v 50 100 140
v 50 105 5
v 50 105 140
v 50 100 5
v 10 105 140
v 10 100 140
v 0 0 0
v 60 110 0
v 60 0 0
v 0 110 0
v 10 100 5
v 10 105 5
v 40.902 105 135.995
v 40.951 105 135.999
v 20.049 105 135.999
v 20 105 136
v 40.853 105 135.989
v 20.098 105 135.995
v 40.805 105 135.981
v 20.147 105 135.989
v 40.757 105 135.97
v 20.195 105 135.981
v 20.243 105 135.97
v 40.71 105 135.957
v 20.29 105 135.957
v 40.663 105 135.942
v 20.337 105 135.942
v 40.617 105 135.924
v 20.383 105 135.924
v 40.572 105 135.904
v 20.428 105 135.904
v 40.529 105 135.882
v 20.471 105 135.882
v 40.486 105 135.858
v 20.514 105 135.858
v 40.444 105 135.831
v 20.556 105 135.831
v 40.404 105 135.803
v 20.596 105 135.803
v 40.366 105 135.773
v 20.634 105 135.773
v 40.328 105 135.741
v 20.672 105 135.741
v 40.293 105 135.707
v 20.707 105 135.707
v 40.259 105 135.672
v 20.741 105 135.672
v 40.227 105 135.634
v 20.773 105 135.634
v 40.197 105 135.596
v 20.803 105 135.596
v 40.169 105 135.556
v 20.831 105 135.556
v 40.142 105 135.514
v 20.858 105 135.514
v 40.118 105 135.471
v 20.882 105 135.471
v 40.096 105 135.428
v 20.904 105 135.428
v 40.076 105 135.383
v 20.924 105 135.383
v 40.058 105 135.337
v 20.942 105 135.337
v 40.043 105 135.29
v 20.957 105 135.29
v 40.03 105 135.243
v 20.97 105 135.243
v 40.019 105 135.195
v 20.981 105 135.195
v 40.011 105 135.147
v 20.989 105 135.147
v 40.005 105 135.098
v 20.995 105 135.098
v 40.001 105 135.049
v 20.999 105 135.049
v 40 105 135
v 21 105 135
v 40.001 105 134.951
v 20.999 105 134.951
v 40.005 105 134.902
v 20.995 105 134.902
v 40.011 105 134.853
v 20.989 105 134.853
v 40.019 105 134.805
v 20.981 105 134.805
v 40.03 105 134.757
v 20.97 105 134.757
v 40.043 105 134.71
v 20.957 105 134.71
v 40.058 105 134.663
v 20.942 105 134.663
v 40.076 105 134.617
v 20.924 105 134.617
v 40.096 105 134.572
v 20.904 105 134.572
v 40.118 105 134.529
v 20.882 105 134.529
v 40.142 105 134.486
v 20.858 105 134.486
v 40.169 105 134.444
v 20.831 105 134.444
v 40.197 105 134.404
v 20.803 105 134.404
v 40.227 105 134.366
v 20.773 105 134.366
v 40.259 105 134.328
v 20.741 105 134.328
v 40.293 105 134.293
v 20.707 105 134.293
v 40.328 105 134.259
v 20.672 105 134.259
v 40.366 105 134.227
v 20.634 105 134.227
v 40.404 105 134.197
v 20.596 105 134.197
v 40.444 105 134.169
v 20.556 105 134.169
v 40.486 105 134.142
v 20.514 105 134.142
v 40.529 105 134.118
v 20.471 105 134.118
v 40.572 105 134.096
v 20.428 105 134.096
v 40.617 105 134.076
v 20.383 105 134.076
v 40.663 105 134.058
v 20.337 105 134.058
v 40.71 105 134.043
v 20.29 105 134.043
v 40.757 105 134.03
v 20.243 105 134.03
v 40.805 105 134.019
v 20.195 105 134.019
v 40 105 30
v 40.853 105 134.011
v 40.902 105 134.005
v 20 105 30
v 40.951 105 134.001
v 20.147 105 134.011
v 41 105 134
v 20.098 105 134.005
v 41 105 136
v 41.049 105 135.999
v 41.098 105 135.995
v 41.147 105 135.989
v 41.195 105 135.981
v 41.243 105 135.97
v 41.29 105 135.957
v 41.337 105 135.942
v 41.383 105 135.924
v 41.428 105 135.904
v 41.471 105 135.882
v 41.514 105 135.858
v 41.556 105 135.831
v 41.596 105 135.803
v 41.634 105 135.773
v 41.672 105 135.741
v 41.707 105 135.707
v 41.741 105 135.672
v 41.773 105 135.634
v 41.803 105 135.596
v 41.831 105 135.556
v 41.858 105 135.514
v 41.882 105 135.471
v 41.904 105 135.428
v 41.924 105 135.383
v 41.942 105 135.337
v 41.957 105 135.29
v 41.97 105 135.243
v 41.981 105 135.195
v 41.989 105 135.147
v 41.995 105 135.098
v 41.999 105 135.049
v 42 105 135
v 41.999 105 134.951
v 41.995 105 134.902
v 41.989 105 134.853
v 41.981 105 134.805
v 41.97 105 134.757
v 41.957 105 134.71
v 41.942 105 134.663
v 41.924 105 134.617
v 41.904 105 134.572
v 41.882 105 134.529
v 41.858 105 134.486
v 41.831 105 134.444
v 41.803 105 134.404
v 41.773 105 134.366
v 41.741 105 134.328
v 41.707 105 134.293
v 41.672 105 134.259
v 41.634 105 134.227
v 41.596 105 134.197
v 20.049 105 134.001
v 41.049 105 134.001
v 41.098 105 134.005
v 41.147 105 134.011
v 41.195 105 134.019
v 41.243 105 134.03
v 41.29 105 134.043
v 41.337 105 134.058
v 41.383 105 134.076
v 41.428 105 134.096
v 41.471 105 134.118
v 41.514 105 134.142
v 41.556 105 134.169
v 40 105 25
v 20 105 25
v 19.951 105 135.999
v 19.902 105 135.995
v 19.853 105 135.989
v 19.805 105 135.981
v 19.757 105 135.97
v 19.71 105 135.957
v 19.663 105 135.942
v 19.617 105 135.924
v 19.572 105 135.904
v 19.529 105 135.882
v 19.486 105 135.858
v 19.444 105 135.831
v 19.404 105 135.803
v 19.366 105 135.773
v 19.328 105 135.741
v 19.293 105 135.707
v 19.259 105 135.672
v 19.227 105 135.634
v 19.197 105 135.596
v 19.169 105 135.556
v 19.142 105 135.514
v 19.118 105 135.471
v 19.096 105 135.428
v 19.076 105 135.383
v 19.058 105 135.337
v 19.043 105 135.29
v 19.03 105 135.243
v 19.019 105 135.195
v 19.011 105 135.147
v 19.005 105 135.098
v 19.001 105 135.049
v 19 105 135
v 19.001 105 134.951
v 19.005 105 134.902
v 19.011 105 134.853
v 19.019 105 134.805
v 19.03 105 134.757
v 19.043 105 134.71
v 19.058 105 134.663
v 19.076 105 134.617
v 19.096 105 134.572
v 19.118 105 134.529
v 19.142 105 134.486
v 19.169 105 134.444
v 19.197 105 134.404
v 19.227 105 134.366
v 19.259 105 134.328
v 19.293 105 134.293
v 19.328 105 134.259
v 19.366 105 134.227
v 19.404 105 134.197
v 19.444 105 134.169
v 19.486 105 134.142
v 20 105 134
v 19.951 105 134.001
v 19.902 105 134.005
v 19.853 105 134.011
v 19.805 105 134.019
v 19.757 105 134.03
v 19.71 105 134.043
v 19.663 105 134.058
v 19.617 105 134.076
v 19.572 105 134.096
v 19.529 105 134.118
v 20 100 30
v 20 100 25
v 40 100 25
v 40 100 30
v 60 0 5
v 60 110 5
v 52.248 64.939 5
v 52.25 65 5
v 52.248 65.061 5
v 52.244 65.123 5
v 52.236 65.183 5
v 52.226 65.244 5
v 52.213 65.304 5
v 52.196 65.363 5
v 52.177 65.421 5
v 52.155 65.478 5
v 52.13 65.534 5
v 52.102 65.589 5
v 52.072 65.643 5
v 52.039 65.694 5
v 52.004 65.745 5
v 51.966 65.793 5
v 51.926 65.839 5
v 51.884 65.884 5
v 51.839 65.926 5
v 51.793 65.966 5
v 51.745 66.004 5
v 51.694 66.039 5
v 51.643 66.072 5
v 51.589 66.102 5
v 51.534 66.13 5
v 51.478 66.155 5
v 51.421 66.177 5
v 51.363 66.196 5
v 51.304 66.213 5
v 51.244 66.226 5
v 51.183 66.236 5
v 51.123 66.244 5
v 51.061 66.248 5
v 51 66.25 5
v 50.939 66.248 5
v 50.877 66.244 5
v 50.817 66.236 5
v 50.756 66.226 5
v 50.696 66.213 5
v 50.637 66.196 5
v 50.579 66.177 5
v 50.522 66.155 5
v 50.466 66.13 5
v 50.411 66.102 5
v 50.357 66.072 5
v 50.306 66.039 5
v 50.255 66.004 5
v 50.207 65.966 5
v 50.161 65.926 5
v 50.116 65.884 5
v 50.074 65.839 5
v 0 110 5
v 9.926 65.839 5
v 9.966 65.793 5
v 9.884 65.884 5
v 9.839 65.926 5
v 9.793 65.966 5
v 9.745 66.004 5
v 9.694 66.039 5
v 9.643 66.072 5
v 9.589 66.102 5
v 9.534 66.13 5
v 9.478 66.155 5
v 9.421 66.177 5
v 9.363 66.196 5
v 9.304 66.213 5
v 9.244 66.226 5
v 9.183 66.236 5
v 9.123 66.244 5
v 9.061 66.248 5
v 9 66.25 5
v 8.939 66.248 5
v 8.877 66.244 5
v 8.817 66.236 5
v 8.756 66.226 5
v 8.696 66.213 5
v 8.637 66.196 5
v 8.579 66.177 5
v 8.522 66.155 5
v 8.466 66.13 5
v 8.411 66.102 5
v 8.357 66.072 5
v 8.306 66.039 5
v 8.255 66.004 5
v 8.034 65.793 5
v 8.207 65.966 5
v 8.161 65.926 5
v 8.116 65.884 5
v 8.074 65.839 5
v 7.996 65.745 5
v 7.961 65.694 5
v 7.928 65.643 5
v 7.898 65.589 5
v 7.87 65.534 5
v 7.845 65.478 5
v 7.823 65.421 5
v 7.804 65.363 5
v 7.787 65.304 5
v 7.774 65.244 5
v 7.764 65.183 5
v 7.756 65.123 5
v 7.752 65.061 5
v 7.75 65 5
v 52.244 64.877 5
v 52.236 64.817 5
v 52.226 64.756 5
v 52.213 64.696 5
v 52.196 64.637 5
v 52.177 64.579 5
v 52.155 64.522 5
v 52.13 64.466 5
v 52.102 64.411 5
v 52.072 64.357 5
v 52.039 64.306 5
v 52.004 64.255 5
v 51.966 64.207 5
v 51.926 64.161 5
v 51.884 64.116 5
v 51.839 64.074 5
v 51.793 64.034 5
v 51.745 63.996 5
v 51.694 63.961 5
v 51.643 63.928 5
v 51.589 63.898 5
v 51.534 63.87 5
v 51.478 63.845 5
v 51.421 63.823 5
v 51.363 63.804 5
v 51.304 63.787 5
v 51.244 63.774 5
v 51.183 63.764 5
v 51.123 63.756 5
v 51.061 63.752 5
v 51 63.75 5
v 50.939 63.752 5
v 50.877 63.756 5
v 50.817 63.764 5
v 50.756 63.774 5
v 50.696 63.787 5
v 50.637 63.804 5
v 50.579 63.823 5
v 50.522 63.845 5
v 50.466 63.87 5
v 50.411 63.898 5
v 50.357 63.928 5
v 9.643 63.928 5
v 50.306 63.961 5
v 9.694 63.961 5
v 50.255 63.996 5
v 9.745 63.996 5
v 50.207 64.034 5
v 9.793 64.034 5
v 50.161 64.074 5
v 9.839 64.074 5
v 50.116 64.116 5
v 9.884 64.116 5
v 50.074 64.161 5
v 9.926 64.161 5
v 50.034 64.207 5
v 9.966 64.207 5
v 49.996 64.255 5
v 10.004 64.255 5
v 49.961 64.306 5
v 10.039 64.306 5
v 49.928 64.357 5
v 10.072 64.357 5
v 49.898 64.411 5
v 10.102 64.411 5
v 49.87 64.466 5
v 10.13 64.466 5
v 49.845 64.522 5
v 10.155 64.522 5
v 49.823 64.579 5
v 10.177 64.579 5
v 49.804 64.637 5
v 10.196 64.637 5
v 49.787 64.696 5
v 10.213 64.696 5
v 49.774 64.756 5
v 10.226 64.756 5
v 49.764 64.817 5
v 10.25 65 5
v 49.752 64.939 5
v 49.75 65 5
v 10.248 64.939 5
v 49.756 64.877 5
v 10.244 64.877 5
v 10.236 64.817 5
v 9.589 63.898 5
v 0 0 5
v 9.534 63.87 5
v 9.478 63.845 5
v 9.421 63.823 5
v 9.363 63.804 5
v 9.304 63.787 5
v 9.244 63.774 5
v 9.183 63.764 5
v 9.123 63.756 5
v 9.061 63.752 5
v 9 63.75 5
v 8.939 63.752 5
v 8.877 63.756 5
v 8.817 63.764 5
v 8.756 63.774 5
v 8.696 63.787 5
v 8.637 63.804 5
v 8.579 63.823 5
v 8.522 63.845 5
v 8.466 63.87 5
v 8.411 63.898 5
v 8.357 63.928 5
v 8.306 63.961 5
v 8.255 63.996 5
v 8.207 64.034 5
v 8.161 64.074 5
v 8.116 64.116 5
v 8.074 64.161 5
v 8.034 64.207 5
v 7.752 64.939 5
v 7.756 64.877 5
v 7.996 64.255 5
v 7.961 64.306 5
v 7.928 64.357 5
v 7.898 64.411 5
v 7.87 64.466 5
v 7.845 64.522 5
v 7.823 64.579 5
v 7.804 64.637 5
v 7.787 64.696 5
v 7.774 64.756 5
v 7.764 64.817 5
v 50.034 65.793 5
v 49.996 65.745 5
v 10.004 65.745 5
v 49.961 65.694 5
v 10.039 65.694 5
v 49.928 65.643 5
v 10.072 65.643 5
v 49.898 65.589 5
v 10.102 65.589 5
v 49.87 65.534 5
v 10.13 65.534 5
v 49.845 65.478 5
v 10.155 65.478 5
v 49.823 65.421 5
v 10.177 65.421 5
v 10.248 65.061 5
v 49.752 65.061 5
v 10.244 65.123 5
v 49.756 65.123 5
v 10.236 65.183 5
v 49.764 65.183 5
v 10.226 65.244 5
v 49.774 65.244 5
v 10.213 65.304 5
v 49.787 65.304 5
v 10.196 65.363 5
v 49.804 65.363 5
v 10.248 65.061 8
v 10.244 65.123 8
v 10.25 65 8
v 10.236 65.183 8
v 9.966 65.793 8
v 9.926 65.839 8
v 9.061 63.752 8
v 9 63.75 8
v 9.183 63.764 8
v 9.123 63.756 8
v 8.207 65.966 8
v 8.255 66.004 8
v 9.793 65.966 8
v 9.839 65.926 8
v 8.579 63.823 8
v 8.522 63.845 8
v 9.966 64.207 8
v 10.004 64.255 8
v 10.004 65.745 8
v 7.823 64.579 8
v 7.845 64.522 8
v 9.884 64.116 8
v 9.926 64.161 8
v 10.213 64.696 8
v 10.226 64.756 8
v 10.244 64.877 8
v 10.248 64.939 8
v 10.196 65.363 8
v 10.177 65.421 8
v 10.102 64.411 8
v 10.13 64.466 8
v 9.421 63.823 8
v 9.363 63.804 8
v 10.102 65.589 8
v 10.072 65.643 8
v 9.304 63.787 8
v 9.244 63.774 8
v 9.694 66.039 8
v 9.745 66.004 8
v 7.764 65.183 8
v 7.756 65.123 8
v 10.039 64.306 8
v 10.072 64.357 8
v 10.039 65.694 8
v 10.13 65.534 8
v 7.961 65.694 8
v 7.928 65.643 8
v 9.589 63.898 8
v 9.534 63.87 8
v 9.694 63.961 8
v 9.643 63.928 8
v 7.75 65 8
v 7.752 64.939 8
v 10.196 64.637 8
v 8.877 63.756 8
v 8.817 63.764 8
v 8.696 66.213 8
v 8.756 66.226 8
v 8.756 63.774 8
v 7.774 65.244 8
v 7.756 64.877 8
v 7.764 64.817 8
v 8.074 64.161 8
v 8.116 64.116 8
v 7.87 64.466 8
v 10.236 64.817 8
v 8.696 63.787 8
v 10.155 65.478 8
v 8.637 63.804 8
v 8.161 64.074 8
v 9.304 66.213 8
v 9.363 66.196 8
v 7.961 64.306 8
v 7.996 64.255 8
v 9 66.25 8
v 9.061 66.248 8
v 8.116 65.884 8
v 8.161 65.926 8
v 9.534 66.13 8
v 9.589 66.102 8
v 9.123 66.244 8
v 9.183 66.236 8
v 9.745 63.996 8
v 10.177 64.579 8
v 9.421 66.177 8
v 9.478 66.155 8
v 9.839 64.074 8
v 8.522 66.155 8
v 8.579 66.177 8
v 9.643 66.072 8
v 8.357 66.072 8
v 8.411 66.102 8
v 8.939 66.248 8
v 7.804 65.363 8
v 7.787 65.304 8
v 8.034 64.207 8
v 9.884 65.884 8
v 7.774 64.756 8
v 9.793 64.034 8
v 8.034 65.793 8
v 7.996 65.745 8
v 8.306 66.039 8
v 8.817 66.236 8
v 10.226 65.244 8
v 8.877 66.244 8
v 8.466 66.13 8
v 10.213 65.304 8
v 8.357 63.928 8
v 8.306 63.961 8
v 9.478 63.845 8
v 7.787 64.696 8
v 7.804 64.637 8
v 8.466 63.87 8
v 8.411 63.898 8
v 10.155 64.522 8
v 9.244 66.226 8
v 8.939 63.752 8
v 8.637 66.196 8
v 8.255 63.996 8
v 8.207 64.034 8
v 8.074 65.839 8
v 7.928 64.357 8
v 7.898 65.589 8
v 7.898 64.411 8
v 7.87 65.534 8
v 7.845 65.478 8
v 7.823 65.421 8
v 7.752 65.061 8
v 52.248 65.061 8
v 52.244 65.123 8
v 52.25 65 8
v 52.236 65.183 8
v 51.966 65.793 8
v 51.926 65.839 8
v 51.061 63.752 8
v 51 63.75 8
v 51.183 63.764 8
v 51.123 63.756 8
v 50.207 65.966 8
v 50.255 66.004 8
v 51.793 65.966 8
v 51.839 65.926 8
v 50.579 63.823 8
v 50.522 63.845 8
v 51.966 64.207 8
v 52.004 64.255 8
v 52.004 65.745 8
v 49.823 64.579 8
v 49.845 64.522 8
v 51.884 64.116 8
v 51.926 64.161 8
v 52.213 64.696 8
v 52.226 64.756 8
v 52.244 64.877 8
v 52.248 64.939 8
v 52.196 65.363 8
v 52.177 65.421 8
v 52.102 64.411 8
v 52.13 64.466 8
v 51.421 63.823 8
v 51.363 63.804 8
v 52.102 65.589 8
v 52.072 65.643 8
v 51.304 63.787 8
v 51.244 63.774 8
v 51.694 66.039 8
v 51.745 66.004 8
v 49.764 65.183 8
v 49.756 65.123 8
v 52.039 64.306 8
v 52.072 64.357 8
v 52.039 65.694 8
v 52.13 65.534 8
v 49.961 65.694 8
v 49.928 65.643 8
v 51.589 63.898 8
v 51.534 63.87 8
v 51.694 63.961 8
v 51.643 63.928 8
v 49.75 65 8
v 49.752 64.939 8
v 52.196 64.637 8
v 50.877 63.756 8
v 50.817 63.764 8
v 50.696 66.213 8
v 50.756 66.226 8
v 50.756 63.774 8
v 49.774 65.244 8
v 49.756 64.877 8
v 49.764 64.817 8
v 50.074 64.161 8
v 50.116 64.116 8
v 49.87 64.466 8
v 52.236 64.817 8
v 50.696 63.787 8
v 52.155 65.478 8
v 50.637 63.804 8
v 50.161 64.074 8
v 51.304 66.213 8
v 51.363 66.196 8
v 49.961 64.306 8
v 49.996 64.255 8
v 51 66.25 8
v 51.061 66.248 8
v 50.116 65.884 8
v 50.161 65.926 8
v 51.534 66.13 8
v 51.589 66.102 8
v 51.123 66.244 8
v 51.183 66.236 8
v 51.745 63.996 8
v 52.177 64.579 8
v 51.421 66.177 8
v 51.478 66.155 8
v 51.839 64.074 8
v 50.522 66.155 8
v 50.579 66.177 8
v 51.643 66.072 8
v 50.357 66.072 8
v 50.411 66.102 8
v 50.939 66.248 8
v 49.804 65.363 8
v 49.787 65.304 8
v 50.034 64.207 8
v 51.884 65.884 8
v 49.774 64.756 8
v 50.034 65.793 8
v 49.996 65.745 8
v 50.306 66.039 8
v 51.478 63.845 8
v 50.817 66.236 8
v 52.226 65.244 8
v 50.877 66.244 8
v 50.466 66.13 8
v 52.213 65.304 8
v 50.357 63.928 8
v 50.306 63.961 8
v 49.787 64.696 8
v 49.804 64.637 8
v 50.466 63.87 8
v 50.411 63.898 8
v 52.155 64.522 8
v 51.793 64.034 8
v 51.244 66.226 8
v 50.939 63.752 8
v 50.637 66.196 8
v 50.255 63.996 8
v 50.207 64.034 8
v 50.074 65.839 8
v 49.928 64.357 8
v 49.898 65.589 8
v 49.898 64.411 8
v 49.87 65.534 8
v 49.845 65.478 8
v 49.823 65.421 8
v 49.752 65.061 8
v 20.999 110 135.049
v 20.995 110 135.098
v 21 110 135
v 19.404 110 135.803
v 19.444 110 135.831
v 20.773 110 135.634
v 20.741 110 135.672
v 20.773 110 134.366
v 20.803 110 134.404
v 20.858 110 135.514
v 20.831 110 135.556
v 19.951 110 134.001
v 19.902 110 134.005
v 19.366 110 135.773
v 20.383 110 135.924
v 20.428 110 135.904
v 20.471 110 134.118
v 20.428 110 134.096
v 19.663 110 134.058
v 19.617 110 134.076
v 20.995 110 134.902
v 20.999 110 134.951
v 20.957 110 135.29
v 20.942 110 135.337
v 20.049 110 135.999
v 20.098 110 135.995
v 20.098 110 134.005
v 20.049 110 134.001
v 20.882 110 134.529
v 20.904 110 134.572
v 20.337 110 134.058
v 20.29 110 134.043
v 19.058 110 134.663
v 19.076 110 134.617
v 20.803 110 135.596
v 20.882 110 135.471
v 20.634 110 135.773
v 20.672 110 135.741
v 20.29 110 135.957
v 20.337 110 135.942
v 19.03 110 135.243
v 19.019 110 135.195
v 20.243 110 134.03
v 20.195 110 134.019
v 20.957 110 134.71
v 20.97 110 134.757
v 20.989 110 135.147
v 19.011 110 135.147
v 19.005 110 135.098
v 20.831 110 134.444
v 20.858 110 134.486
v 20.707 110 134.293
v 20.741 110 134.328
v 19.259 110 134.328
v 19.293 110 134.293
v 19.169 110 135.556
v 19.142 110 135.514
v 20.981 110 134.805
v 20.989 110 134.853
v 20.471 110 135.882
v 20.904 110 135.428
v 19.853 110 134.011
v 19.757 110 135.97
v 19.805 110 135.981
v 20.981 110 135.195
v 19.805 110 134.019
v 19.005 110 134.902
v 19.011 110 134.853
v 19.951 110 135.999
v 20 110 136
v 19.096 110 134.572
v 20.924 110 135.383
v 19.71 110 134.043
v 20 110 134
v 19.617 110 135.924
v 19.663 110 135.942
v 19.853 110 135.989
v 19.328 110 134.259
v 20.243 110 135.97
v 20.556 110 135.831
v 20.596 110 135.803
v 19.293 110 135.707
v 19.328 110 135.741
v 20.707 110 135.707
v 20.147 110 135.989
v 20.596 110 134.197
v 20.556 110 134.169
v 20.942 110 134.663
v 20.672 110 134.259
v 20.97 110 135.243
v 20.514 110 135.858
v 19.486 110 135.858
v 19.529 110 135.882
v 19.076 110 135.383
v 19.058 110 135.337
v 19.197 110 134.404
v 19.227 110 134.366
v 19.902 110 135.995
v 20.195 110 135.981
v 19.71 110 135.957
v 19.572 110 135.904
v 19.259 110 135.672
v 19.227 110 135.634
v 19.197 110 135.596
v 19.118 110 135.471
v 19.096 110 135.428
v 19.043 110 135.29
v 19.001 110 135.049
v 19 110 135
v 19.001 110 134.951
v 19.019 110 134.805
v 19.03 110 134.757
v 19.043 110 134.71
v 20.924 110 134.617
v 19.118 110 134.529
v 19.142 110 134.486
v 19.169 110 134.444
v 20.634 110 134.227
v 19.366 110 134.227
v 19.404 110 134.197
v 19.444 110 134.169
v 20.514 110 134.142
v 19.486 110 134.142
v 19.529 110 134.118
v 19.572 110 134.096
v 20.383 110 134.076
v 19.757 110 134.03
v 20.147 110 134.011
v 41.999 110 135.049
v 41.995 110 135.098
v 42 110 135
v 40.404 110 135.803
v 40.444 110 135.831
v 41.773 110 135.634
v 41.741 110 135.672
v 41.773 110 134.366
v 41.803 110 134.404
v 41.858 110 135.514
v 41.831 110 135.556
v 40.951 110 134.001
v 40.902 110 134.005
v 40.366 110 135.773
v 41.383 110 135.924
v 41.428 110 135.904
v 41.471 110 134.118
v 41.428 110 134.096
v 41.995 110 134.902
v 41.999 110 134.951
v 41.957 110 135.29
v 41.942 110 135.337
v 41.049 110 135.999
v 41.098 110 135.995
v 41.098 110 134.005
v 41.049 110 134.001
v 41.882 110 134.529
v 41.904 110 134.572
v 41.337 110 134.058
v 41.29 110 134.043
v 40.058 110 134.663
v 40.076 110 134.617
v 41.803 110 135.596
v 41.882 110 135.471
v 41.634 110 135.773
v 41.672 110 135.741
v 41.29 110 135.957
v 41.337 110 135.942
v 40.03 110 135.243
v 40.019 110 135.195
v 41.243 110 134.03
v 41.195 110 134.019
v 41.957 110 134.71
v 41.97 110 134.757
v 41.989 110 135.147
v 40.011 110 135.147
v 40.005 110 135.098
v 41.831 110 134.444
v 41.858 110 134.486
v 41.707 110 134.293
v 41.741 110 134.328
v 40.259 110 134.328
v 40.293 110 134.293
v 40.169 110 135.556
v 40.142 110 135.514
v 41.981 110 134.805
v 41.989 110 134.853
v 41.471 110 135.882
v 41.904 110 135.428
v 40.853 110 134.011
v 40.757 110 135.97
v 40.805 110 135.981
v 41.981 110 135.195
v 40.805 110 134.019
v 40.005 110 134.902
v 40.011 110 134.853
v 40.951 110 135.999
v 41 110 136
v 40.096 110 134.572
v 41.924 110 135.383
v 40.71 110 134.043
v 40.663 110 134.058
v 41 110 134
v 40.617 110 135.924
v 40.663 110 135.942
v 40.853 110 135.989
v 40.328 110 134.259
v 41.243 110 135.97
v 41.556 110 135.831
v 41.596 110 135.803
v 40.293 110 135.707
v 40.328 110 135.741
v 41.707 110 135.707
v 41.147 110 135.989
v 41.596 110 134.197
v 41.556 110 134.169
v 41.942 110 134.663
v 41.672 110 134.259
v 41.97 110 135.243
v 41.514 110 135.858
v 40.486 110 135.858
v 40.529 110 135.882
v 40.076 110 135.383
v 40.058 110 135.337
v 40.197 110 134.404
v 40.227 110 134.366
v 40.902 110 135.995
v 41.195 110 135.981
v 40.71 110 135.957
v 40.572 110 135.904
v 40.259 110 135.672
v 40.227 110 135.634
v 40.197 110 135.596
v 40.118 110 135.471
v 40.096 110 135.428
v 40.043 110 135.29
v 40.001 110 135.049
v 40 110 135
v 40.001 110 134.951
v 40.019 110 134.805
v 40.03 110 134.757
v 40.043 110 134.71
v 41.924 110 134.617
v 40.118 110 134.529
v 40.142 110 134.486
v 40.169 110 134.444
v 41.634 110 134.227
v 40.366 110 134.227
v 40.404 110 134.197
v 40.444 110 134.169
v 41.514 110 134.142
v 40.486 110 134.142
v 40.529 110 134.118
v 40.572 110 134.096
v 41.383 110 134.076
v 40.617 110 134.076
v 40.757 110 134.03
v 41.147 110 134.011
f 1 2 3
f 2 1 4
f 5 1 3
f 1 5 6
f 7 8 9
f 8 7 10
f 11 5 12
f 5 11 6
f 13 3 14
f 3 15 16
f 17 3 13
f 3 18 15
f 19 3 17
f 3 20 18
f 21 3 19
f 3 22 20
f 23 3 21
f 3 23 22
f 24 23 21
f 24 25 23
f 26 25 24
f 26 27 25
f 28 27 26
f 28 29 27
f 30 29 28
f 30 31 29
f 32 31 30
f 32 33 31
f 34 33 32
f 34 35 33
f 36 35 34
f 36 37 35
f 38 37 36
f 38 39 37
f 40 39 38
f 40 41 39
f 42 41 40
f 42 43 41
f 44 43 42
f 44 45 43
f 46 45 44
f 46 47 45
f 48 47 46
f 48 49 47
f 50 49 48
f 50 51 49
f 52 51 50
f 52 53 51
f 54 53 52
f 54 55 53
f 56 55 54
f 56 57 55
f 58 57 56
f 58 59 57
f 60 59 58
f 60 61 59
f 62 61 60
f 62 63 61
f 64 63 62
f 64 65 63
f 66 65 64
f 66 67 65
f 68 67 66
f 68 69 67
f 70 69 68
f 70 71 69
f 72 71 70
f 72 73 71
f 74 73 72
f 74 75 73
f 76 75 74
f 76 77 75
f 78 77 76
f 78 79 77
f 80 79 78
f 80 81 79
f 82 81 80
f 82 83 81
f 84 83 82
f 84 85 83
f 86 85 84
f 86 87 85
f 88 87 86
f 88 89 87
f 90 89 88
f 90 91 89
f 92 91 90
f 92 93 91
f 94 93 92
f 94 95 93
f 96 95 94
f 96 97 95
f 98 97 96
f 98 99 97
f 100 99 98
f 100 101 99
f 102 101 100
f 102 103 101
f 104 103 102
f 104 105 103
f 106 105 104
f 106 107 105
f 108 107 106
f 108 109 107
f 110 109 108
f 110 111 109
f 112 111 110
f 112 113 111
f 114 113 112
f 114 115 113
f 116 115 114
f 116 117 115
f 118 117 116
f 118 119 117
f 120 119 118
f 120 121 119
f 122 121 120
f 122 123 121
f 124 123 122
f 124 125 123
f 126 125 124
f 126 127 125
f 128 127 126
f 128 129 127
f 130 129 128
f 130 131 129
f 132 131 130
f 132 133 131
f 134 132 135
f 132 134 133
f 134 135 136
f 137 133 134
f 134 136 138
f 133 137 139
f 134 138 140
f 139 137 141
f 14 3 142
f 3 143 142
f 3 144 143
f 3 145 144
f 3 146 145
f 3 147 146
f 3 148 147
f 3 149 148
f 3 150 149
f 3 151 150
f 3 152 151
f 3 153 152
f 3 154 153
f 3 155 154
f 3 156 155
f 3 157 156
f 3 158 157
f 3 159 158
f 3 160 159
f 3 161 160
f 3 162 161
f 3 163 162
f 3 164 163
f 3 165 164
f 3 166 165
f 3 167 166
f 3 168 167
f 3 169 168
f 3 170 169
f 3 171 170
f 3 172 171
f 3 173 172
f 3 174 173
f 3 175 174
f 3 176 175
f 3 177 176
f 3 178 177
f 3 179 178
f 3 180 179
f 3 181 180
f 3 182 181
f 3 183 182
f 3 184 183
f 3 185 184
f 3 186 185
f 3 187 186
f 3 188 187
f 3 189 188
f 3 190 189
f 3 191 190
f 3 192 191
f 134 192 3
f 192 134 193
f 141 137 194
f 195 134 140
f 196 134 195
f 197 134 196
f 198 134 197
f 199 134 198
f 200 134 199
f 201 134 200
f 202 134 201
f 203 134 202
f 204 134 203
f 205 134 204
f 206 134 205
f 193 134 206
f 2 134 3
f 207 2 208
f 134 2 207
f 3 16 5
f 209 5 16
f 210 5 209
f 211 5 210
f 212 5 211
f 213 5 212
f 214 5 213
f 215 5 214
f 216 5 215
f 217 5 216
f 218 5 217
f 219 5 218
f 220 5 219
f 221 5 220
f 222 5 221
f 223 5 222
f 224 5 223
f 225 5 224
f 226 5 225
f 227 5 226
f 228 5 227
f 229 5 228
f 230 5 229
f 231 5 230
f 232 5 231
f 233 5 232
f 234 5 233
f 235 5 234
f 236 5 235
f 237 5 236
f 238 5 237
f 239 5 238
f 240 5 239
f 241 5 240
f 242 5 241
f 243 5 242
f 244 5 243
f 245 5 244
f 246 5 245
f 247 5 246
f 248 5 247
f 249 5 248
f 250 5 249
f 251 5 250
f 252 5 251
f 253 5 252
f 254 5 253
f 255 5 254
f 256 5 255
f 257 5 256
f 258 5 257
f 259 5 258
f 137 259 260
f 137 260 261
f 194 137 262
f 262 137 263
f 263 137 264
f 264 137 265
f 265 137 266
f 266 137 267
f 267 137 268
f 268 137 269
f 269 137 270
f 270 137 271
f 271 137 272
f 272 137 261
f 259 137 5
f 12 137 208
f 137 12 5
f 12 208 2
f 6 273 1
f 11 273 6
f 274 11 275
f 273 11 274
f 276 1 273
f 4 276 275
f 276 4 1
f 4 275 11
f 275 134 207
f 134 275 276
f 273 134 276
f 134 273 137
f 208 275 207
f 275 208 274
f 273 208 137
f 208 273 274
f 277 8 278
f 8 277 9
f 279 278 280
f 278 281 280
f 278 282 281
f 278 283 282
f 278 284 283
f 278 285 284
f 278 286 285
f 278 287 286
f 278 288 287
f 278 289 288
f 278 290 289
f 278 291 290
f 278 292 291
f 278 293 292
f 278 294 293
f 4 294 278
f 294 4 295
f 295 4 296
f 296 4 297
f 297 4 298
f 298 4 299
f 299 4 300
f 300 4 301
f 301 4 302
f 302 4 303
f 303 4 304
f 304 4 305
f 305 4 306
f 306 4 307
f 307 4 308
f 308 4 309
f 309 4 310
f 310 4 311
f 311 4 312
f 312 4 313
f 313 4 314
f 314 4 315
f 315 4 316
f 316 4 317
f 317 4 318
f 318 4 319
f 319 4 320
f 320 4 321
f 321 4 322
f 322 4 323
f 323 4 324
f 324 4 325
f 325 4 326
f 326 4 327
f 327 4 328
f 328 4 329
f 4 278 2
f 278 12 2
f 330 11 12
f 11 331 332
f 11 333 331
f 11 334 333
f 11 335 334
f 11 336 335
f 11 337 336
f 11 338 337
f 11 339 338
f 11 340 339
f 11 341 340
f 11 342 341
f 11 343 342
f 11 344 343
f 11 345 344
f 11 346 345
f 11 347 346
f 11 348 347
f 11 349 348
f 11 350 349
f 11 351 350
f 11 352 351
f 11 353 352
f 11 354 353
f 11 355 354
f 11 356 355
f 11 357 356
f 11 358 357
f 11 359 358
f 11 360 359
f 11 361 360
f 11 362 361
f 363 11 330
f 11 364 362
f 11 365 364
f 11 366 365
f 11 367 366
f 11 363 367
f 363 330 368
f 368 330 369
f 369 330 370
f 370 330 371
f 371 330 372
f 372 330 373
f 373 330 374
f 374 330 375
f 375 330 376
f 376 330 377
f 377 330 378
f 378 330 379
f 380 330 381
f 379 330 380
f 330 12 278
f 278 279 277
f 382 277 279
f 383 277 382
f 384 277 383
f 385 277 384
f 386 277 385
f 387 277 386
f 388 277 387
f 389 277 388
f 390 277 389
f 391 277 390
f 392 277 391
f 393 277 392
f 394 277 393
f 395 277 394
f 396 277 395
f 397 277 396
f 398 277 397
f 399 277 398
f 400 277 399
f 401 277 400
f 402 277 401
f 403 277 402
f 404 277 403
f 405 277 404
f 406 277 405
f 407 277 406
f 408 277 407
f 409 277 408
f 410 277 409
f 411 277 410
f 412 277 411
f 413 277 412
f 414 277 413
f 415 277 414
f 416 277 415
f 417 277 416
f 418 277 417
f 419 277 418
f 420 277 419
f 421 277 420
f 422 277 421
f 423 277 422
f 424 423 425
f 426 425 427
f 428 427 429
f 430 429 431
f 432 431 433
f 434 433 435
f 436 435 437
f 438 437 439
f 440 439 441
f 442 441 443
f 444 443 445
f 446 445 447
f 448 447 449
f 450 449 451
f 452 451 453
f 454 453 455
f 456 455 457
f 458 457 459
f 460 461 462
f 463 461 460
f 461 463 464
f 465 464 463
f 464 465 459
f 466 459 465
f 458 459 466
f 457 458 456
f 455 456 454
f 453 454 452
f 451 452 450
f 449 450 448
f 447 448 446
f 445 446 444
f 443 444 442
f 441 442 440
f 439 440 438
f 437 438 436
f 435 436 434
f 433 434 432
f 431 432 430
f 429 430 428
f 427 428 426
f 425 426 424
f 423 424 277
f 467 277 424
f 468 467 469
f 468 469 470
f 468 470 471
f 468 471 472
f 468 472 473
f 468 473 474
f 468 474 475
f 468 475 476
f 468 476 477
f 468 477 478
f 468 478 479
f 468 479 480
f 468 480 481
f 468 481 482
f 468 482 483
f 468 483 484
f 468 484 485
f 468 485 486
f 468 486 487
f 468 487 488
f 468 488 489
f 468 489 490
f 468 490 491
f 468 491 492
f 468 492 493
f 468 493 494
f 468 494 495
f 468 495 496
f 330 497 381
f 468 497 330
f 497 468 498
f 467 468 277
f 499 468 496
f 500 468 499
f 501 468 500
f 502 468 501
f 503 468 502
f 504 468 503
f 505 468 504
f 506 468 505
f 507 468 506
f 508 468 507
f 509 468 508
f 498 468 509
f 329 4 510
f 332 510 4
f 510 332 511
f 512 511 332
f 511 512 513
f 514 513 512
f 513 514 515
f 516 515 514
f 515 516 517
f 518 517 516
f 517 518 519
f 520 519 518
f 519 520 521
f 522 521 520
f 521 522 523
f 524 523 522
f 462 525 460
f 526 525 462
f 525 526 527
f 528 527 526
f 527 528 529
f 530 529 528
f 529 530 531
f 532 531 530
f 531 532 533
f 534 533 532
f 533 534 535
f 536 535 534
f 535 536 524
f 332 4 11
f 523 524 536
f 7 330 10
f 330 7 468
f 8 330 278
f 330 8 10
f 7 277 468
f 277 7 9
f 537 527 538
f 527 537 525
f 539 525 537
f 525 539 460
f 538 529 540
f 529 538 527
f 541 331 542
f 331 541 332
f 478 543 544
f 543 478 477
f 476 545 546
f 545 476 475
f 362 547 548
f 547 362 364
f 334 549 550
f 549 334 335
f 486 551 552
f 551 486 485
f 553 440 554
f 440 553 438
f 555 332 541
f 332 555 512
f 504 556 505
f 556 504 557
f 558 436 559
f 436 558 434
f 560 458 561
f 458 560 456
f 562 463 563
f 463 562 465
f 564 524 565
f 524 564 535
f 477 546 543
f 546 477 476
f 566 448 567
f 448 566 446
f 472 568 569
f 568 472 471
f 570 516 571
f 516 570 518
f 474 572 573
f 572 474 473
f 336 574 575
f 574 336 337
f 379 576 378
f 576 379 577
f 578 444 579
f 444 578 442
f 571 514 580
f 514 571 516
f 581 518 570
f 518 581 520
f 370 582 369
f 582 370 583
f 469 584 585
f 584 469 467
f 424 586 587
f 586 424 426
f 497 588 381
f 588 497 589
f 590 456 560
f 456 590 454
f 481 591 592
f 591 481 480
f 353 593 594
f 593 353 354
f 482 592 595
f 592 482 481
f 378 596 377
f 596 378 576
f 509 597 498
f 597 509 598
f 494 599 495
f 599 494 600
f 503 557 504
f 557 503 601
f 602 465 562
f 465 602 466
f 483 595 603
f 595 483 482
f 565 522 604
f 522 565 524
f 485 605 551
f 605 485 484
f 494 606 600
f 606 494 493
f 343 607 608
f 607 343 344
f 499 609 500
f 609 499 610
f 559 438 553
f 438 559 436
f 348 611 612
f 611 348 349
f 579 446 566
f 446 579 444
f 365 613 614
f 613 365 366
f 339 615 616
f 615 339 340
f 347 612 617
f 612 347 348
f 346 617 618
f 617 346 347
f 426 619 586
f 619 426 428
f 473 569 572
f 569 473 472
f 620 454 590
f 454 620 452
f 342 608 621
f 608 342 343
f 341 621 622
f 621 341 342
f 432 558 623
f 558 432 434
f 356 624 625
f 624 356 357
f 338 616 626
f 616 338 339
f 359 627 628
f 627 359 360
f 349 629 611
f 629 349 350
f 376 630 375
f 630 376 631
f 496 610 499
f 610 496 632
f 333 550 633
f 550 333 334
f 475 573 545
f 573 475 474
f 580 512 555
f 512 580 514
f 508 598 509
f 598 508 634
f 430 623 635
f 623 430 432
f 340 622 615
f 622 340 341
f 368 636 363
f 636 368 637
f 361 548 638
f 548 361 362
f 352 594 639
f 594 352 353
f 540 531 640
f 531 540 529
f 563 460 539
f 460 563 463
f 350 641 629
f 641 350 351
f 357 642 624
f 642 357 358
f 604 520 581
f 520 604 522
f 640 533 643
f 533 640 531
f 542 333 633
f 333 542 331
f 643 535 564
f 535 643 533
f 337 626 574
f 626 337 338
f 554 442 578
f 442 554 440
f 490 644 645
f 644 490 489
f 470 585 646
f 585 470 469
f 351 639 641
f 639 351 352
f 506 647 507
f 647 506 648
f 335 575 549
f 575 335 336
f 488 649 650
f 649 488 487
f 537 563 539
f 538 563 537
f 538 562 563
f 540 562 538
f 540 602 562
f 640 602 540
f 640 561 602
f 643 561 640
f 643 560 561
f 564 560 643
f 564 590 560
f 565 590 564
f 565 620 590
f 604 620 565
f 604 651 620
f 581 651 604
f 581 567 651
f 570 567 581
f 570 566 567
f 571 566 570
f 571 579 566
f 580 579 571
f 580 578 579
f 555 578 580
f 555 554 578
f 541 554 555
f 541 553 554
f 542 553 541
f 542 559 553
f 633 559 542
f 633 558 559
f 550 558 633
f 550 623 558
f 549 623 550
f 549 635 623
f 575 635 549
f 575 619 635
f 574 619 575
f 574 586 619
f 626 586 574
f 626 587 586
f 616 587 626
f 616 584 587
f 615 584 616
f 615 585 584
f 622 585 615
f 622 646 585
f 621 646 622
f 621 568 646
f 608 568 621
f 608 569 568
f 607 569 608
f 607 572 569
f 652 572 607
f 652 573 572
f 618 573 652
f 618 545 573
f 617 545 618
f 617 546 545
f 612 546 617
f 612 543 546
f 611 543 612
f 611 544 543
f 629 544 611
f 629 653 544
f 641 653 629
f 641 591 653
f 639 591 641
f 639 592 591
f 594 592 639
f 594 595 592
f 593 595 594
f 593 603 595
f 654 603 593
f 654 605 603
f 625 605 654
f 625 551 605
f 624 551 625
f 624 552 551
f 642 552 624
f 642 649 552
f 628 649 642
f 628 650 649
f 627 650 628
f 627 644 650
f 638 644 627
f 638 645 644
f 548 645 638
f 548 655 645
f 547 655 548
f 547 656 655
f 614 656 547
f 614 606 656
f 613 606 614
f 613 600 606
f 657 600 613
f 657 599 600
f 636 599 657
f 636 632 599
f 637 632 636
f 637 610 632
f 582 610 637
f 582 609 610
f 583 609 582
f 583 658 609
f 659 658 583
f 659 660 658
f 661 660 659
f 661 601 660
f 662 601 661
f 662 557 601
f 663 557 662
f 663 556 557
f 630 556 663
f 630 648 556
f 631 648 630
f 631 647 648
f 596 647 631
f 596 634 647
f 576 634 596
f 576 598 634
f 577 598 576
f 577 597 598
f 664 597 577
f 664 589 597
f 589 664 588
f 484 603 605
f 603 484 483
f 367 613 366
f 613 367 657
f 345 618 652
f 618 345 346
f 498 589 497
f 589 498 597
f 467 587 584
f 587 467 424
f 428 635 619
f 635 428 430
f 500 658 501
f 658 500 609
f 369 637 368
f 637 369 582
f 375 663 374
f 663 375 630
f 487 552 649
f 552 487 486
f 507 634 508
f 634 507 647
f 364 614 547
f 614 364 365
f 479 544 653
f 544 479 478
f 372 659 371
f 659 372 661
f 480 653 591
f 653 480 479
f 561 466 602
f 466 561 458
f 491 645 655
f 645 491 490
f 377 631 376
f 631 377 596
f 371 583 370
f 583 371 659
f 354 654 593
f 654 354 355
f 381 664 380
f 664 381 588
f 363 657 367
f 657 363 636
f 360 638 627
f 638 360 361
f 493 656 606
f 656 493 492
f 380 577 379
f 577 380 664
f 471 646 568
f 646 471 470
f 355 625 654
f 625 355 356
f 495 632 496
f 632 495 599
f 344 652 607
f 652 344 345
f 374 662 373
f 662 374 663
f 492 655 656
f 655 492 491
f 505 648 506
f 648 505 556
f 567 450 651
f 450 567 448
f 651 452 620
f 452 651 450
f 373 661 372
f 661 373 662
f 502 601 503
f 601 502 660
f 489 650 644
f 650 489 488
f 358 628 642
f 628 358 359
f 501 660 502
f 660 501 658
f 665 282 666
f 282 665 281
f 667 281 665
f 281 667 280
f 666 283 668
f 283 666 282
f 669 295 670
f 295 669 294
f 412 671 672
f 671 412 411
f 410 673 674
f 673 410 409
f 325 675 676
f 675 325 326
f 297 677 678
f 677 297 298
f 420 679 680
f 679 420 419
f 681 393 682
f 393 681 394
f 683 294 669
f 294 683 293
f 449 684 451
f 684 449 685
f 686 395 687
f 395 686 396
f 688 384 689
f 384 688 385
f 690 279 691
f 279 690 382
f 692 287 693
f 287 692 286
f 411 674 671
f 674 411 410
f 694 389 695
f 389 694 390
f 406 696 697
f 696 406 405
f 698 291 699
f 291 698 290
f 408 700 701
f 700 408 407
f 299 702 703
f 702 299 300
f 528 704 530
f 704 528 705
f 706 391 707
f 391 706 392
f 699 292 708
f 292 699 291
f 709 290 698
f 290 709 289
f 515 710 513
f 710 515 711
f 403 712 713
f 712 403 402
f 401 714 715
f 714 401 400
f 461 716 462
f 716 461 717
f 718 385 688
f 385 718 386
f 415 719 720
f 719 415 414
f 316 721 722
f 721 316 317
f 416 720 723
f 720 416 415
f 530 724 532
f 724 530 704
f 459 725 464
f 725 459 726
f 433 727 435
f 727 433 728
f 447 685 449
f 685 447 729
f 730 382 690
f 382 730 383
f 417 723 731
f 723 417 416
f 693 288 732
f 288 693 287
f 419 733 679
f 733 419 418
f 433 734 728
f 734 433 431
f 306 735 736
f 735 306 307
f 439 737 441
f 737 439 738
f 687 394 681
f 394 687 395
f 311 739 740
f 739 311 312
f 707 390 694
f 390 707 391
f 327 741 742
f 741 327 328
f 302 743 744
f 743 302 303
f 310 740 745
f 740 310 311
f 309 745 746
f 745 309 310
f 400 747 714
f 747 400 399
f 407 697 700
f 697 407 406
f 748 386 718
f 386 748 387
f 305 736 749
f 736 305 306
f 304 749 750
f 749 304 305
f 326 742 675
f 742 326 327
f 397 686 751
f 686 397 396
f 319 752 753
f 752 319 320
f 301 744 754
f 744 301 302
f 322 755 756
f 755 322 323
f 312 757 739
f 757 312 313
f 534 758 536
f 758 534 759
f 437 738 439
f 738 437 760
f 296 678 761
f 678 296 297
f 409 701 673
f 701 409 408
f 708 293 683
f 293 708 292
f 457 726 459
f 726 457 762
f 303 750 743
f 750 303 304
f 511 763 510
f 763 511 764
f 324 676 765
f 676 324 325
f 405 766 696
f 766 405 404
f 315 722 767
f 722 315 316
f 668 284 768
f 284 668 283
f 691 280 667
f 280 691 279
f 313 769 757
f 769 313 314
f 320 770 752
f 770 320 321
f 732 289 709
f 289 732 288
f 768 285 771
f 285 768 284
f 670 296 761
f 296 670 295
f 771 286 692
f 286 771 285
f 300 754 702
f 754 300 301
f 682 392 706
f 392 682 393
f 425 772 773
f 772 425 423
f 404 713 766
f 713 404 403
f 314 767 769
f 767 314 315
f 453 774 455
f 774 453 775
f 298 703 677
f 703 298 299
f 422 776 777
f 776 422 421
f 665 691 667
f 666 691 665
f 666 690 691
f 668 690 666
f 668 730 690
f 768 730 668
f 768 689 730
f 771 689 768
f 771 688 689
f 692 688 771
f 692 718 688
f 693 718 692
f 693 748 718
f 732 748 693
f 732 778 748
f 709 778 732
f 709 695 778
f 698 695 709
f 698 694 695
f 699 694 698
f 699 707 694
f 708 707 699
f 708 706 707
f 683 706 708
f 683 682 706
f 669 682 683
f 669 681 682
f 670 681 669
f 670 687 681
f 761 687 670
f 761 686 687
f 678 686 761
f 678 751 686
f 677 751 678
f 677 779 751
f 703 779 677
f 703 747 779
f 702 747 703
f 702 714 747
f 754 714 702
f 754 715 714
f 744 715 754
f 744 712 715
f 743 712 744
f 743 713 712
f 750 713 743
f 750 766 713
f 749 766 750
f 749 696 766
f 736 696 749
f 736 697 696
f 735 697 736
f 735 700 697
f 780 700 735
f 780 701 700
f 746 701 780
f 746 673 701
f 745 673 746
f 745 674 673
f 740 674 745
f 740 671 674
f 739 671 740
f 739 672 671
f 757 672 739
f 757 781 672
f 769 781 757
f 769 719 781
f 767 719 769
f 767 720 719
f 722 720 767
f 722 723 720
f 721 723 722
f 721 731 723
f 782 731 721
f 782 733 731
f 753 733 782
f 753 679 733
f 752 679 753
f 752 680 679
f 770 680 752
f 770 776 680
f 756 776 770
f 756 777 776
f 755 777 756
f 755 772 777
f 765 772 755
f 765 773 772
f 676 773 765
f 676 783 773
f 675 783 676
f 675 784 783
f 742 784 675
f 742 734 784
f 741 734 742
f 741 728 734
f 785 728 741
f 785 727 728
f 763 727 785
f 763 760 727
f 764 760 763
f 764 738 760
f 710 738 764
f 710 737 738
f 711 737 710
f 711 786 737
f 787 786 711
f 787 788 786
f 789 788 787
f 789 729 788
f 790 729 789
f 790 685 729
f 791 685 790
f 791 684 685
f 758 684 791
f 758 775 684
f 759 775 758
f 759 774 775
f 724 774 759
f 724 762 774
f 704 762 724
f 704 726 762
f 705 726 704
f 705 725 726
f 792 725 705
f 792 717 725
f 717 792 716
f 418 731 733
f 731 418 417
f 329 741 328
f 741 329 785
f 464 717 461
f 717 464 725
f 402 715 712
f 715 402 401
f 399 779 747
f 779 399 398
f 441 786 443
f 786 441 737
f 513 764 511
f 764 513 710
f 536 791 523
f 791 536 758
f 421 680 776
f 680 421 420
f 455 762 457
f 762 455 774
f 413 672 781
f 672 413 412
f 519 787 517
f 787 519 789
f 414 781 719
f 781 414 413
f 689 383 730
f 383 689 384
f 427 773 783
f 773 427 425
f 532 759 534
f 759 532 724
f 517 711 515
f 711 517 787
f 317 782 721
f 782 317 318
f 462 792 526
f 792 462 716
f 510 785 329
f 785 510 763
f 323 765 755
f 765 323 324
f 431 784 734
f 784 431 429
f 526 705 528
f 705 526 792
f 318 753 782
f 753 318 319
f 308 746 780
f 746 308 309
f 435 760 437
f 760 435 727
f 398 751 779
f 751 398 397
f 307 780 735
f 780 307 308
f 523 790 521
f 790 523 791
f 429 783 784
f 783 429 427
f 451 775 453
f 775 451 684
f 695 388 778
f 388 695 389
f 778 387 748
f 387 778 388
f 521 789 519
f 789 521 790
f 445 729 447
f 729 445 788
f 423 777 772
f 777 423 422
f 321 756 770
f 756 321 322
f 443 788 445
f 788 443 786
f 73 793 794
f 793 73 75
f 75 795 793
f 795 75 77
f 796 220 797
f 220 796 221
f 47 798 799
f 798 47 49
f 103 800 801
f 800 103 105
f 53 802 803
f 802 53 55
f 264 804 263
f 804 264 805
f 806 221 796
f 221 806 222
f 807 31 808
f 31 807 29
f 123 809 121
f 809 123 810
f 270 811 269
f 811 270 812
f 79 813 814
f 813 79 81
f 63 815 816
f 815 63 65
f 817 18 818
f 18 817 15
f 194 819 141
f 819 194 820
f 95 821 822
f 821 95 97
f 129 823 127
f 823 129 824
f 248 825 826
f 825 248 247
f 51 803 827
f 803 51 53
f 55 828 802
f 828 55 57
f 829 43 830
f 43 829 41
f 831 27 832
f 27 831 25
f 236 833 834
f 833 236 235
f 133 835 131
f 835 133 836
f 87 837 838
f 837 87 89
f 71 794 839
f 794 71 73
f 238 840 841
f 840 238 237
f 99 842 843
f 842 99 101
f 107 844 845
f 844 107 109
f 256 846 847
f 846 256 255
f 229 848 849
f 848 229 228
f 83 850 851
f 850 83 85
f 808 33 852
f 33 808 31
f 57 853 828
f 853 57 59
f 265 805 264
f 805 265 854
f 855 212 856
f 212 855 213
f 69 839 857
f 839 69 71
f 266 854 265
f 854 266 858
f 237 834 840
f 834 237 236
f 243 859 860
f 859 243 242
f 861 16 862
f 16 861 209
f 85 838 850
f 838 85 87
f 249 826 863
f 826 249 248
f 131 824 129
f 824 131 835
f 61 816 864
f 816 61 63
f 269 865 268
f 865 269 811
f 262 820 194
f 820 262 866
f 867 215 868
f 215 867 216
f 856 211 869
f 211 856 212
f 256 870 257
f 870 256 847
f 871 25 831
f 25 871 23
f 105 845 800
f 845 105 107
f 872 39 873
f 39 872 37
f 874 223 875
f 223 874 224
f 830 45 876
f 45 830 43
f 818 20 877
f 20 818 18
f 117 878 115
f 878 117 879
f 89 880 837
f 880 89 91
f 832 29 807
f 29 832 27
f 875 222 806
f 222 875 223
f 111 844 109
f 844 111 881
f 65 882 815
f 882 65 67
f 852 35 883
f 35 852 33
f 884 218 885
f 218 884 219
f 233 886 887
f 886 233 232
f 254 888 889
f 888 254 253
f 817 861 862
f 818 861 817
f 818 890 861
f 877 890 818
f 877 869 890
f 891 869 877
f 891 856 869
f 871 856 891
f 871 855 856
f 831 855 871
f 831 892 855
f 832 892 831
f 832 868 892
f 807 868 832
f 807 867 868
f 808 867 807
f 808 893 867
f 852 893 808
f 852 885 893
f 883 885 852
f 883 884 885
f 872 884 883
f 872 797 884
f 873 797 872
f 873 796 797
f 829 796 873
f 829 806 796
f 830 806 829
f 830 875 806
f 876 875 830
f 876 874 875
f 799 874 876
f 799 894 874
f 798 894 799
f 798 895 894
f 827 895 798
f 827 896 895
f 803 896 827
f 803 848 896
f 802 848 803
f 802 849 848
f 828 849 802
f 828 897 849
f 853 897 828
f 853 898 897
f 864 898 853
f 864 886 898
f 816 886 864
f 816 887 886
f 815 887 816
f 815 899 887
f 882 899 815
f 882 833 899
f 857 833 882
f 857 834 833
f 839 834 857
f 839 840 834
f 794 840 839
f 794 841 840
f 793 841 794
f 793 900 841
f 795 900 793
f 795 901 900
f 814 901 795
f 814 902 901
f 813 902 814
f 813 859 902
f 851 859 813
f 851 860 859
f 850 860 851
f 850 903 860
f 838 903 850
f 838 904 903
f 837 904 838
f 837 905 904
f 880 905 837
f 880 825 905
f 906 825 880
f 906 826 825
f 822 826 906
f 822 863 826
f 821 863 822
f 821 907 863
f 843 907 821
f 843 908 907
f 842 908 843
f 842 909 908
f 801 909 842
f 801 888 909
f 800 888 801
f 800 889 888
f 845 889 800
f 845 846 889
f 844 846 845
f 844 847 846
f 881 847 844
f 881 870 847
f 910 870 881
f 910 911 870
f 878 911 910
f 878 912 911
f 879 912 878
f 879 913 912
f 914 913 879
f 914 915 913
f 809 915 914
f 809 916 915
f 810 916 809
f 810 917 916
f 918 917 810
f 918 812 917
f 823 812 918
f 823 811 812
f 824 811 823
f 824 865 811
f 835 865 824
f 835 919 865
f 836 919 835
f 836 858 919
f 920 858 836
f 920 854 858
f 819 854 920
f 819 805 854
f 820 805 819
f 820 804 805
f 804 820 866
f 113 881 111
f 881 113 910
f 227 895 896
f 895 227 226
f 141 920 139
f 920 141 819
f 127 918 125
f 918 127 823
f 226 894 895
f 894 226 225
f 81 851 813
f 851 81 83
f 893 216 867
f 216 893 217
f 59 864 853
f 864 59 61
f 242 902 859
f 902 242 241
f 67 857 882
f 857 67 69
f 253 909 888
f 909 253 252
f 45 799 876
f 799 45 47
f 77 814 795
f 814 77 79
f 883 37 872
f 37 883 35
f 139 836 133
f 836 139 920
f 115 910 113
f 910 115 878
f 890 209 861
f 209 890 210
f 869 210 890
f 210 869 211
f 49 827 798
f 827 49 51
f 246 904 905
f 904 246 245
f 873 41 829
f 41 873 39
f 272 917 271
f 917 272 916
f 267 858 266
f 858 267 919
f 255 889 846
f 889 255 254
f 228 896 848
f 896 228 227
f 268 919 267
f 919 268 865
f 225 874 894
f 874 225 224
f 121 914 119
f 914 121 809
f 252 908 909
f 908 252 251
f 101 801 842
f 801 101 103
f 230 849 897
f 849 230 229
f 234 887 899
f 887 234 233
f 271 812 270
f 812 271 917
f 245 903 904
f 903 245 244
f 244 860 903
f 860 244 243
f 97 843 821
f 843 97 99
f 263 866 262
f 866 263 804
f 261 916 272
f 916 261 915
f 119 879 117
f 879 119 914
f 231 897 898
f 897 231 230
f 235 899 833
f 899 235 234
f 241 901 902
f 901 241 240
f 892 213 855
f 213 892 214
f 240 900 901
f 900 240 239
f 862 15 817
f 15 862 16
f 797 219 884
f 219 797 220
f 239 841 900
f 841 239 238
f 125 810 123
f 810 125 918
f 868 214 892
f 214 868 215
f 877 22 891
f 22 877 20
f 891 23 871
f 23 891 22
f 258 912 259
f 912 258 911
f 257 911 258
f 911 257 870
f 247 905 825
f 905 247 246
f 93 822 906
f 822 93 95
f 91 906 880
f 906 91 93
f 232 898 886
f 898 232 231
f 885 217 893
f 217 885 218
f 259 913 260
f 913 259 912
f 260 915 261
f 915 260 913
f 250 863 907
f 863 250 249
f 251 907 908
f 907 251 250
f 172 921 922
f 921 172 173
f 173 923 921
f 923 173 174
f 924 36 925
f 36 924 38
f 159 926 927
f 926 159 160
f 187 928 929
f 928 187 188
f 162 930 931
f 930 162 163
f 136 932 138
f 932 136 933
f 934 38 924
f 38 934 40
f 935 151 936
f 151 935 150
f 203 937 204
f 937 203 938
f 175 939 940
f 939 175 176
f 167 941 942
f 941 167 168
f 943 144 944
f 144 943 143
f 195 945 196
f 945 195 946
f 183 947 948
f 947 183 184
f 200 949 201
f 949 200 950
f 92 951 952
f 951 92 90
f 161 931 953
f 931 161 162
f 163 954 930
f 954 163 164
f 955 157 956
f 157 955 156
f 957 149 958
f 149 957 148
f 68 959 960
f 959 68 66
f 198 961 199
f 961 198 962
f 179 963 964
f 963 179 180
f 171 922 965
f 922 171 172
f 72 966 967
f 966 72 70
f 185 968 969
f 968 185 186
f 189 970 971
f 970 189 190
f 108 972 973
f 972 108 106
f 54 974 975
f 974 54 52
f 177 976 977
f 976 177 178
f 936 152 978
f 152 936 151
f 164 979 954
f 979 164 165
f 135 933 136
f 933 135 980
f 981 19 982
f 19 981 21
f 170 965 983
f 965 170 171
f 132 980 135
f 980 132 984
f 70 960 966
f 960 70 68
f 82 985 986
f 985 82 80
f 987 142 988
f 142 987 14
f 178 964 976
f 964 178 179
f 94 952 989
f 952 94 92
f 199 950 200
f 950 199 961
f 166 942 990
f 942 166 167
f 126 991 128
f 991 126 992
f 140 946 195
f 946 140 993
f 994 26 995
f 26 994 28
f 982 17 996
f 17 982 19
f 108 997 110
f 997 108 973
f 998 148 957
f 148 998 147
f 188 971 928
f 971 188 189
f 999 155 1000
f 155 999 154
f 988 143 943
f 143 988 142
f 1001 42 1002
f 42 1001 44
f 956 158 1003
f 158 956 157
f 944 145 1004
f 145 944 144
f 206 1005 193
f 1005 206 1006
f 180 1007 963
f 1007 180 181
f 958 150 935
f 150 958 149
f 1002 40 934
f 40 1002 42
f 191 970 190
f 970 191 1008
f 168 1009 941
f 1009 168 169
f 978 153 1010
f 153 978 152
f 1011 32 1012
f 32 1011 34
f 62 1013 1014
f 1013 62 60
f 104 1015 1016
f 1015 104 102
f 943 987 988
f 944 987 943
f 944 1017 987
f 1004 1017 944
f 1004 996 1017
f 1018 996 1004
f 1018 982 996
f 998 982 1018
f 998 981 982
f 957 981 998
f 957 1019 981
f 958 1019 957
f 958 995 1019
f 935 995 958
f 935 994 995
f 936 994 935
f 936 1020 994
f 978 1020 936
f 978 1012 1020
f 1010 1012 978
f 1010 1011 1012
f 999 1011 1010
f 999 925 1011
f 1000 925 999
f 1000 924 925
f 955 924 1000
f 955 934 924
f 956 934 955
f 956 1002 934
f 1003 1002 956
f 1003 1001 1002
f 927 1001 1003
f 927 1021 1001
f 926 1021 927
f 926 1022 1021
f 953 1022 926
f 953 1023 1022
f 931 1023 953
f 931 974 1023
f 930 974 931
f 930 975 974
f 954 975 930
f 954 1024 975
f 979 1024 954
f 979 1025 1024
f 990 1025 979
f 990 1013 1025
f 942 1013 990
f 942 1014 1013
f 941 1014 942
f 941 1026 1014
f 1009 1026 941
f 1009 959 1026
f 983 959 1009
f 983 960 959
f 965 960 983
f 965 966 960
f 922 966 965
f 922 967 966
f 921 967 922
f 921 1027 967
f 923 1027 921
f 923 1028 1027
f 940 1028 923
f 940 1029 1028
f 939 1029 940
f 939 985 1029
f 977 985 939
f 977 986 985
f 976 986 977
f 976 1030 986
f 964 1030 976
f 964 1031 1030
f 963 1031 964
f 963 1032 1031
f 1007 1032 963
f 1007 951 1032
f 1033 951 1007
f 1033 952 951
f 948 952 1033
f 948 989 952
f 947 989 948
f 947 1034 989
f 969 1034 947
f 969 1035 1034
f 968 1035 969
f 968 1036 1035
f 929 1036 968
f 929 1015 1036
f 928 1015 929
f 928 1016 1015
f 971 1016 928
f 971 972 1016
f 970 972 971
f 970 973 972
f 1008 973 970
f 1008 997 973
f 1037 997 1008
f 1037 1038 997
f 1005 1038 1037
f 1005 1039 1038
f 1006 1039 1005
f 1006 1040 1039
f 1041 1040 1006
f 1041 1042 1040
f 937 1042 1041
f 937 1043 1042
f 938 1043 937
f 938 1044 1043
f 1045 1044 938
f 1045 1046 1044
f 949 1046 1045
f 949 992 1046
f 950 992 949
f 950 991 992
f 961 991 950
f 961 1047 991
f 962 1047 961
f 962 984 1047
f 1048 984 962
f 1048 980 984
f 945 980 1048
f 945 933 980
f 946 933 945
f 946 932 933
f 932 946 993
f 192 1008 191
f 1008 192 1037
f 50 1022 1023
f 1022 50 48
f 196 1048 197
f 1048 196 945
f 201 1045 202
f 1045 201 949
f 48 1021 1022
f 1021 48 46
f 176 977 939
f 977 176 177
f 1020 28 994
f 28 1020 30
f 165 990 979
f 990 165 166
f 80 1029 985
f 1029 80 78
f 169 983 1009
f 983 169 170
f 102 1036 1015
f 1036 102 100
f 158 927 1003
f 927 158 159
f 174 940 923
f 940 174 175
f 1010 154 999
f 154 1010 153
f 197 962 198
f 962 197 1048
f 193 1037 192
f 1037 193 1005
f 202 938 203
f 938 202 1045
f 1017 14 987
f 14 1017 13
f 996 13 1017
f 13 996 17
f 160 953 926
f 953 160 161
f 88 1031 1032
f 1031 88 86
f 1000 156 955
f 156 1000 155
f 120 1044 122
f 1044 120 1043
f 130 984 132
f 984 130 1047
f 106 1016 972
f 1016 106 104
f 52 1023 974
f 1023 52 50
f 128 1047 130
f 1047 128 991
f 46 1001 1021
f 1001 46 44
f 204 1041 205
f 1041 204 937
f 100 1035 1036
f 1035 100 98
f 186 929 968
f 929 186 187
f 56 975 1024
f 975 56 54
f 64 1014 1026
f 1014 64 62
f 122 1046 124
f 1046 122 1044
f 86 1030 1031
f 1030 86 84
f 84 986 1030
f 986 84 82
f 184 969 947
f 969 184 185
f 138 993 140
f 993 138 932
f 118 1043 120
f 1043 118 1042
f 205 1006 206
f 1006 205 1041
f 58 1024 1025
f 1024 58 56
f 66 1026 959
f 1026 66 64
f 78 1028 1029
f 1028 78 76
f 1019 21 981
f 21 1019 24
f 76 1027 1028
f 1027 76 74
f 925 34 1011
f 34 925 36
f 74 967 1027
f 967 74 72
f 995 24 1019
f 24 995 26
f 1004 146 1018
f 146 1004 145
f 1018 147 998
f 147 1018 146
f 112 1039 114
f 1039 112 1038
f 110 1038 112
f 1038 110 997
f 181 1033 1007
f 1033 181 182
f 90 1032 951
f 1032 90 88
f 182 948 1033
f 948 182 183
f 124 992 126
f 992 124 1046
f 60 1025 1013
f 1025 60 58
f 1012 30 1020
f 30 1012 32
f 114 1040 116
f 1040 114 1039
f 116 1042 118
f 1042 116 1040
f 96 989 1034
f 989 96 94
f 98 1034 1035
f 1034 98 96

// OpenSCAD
$fn=128;
cube([60,110,5]);
difference()
{
  translate([10,100,0]) cube([40,5,140]);
  translate([20,80,25]) cube([20,30,5]);
}
translate([9,65,0]) cylinder(d=2.5, h=8);
translate([51,65,0]) cylinder(d=2.5, h=8);
translate([20,110,135]) rotate([90,0,0]) cylinder(h=10,d=2);
translate([41,110,135]) rotate([90,0,0]) cylinder(h=10,d=2);
